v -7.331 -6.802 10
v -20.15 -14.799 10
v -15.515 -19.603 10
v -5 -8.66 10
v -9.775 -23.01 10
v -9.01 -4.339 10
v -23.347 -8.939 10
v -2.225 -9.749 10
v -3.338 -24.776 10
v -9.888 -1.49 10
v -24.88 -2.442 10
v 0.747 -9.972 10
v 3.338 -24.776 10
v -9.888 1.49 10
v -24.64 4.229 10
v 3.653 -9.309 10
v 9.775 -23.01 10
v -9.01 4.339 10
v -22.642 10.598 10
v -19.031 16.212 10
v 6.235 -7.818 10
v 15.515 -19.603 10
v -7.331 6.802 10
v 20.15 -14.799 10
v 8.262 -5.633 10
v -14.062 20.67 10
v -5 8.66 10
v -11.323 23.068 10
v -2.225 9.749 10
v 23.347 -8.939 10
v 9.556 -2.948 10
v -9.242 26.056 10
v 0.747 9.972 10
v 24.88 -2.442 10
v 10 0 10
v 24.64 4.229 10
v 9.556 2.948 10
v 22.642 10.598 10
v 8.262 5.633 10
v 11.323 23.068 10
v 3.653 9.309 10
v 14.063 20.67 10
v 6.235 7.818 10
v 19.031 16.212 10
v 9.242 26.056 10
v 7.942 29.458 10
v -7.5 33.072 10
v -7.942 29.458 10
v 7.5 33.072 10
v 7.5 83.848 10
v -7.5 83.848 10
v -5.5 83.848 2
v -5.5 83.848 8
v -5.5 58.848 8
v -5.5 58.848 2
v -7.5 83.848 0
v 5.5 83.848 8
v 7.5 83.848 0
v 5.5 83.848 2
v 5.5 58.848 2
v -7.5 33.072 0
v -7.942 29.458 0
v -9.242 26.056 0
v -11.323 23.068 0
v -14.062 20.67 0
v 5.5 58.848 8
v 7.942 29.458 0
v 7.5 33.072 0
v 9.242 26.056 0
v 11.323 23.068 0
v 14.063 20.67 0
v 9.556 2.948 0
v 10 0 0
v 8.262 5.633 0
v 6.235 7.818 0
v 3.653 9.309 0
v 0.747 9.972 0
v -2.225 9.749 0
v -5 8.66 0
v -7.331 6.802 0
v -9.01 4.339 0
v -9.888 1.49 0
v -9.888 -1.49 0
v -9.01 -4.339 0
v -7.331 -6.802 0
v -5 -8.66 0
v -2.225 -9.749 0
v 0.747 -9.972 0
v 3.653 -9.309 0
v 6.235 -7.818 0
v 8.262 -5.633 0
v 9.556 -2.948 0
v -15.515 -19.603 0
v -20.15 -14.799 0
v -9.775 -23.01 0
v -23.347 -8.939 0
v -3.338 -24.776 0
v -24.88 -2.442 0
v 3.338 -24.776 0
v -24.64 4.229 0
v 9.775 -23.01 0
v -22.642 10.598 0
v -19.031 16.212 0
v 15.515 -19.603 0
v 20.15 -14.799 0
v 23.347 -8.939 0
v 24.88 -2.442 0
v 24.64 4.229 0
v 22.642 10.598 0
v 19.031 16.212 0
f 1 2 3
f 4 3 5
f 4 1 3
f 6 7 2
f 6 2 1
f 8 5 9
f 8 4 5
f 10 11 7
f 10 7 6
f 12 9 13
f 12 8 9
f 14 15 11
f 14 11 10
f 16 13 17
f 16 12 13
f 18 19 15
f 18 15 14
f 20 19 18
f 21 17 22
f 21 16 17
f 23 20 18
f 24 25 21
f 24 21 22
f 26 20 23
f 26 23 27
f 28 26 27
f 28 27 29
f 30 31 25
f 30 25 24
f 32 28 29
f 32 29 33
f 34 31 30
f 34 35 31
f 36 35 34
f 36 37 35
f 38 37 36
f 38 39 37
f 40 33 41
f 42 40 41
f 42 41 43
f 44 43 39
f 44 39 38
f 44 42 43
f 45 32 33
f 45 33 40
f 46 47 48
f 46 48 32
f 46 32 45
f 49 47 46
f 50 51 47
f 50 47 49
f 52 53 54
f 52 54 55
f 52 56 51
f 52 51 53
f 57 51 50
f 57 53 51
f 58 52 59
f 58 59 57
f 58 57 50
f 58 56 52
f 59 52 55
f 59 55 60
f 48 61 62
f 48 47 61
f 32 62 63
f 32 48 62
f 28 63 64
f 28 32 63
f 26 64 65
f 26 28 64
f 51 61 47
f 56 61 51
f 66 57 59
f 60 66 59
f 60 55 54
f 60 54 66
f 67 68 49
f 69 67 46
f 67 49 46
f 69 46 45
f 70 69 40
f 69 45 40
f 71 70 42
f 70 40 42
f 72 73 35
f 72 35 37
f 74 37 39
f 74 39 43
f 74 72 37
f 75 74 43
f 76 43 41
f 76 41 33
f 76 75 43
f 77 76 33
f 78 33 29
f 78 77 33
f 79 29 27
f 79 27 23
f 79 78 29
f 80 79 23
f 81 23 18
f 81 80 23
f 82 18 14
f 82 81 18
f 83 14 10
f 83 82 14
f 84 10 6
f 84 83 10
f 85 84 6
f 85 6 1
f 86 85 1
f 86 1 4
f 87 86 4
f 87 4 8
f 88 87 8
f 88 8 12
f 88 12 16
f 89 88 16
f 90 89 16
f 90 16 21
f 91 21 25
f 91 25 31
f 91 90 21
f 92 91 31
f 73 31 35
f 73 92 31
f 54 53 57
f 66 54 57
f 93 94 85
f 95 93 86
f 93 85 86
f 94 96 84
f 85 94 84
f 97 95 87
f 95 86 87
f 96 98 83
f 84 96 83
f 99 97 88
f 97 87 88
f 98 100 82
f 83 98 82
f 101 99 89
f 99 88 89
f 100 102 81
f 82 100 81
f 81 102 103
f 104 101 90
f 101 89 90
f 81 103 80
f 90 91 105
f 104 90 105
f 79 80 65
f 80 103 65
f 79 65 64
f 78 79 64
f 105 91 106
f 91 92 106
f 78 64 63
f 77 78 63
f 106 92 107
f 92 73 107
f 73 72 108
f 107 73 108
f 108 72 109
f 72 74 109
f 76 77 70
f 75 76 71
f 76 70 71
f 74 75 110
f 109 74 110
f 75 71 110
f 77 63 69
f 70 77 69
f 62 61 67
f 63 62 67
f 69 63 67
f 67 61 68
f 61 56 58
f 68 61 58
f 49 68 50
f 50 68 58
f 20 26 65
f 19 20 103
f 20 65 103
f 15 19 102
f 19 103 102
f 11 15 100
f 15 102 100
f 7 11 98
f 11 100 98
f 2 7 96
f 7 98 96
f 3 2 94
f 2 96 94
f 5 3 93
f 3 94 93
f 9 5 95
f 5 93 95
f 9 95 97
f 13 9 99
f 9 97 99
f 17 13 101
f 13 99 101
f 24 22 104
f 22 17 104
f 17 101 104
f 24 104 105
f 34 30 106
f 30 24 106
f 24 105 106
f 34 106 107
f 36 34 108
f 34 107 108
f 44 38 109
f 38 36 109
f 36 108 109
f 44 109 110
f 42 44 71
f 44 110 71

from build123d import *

# Parameters (mm, degrees)
SKETCH1_R           = 25
SKETCH1_R_2         = 10
BOSS_EXTRUDE1_DEPTH = 10
SKETCH2_W           = 15
SKETCH2_H           = 60
BOSS_EXTRUDE2_DEPTH = 10
FILLET1_R           = 15
SKETCH3_W           = 11
SKETCH3_H           = 6
CUT_EXTRUDE1_DEPTH  = 25


with BuildPart() as part:
    # Sketch1 → Boss-Extrude1 (new body)
    with BuildSketch(Plane.XY):
        Circle(SKETCH1_R)
        Circle(SKETCH1_R_2, mode=Mode.SUBTRACT)
    extrude(amount=BOSS_EXTRUDE1_DEPTH)

    # Sketch2 → Boss-Extrude2 (add)
    with BuildSketch(Plane.XY):
        with Locations((0, 53.848480035)):
            Rectangle(SKETCH2_W, SKETCH2_H)
    extrude(amount=BOSS_EXTRUDE2_DEPTH)

    # Fillet1
    fillet1_edges = [part.edges().sort_by_distance(p)[0] for p in [
        (-7.5, 23.848480035, 5),
        (7.5, 23.848480035, 5),
    ]]
    fillet(fillet1_edges, radius=FILLET1_R)

    # Sketch3 → Cut-Extrude1 (cut)
    with BuildSketch(Plane(origin=(0, 83.848480035, 0), x_dir=(1, 0, 0), z_dir=(0, 1, 0))):
        with Locations((0, -5)):
            Rectangle(SKETCH3_W, SKETCH3_H)
    extrude(amount=-CUT_EXTRUDE1_DEPTH, mode=Mode.SUBTRACT)


solid = part.part
